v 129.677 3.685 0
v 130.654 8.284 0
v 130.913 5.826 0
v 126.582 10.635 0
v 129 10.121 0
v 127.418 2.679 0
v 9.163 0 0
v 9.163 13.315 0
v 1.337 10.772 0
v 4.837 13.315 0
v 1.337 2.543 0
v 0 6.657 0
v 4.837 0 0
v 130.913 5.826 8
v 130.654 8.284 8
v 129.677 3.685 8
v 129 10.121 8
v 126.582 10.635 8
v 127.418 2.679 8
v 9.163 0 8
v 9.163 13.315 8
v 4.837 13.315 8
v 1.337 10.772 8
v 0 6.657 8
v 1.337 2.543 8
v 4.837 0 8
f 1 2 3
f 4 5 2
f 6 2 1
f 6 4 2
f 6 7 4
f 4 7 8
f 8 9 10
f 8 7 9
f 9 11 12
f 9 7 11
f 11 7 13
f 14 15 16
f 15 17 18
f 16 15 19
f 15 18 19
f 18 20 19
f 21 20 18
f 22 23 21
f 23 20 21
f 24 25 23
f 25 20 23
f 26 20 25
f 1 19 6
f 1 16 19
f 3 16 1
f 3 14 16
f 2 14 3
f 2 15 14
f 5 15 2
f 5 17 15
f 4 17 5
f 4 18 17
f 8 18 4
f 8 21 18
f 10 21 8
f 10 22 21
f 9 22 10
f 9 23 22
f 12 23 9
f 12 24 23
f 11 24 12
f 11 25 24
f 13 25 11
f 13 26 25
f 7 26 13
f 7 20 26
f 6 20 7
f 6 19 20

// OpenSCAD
$fn = 32;

// ----------------------------------------------------------------------
// Lever arm: two bosses 14 and 8 mm, 75 mm between centres
// ----------------------------------------------------------------------

// --- parameters (mm) ---
profile_height = 8;       // extrusion height
profile_points = 13;      // points of the closed outline

profile = [[0, 6.657], [1.337, 2.543], [4.837, 0], [9.163, 0], [127.418, 2.679], [129.677, 3.685], [130.913, 5.826], [130.654, 8.284], [129, 10.121], [126.582, 10.635], [9.163, 13.315], [4.837, 13.315], [1.337, 10.772]];  // single closed polygon, 13 points, counter clockwise

// --- the one profile operation ---
linear_extrude(height = profile_height) polygon(points = profile);
